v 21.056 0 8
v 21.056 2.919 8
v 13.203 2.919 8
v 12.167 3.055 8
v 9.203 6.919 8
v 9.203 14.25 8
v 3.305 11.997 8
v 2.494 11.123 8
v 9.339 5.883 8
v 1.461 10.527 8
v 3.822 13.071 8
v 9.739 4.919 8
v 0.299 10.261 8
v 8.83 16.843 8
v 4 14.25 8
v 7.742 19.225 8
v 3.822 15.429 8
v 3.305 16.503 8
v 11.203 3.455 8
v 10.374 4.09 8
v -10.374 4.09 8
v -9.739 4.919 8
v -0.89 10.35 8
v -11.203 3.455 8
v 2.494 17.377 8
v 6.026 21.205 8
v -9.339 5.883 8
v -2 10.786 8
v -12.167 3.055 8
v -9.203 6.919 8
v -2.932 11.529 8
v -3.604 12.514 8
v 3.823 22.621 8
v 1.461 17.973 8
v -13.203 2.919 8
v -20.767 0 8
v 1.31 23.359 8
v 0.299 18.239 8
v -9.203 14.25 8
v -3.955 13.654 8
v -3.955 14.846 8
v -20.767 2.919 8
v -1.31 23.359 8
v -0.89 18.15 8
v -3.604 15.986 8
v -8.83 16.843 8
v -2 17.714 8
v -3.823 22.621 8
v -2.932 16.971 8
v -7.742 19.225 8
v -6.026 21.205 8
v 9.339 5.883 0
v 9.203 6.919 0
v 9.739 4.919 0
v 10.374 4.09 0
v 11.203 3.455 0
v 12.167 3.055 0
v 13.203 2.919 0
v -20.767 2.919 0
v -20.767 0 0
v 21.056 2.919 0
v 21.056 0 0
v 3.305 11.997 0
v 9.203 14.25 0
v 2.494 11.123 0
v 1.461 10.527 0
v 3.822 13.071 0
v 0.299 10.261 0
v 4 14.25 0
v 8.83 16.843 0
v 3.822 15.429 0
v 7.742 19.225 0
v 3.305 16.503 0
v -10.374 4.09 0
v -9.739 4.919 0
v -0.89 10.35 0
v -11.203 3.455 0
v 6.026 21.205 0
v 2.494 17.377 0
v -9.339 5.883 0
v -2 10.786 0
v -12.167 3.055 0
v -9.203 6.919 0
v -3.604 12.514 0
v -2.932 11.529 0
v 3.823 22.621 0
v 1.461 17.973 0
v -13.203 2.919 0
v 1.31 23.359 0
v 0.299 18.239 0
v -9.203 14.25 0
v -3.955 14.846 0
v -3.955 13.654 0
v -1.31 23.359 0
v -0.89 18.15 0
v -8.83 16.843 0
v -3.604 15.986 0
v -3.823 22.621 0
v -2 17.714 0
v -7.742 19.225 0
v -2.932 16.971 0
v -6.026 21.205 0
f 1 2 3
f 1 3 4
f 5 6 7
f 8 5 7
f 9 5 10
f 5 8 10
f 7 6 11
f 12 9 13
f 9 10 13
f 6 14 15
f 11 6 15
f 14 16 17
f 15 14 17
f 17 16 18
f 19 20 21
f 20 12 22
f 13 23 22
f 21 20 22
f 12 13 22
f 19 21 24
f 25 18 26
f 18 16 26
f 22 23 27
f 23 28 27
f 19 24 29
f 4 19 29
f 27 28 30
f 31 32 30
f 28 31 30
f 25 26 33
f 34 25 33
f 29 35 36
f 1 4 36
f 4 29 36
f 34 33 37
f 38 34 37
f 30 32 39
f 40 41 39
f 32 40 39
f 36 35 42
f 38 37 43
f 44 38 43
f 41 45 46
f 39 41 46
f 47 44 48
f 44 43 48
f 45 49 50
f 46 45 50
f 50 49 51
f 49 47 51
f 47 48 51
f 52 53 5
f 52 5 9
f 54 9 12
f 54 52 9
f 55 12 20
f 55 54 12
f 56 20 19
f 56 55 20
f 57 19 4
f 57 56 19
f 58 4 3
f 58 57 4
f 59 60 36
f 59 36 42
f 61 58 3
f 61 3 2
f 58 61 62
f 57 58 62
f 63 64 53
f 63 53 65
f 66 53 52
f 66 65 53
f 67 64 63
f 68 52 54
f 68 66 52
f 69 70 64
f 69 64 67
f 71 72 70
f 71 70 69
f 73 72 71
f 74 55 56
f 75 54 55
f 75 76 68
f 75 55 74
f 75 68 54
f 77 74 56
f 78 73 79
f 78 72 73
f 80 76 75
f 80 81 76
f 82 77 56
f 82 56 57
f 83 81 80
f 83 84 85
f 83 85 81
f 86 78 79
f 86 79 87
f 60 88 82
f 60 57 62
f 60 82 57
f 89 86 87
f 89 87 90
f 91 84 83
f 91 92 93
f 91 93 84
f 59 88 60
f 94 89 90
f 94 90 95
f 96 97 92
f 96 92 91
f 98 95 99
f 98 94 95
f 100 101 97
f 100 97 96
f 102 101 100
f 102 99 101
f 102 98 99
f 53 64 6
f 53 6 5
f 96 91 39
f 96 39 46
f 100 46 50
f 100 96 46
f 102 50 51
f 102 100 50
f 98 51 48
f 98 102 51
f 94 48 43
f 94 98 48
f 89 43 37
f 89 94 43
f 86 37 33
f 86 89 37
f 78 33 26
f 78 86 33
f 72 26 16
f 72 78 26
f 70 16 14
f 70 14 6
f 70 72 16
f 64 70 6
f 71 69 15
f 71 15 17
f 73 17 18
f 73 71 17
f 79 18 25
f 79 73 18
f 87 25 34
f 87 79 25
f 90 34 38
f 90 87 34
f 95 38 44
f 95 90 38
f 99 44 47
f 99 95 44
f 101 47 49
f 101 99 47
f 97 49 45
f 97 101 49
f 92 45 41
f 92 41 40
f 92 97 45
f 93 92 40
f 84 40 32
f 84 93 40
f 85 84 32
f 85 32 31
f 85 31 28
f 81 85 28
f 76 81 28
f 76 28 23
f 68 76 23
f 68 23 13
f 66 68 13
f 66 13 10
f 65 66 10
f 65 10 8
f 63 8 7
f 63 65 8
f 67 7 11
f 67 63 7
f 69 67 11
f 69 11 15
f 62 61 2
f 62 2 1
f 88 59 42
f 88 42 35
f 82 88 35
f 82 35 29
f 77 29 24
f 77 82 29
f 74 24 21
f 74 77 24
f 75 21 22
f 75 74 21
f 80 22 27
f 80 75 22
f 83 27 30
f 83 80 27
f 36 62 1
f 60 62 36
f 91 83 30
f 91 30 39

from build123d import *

# Parameters (mm, degrees)
SKETCH1_R           = 4
BOSS_EXTRUDE1_DEPTH = 8


with BuildPart() as part:
    # Sketch1 → Boss-Extrude1 (new body)
    with BuildSketch(Plane.XY):
        with BuildLine():
            Line((-20.767338367, 0), (-20.767338367, 2.918605514))
            Line((-20.767338367, 2.918605514), (-13.202627173, 2.918605514))
            ThreePointArc((-13.202627173, 2.918605514), (-10.374200048, 4.090178389), (-9.202627173, 6.918605514))
            Line((-9.202627173, 6.918605514), (-9.202627173, 14.25))
            ThreePointArc((-9.202627173, 14.25), (0, 23.452627173), (9.202627173, 14.25))
            Line((9.202627173, 14.25), (9.202627173, 6.918605514))
            ThreePointArc((9.202627173, 6.918605514), (10.374200048, 4.090178389), (13.202627173, 2.918605514))
            Line((13.202627173, 2.918605514), (21.055610972, 2.918605514))
            Line((21.055610972, 2.918605514), (21.055610972, 0))
            Line((21.055610972, 0), (-20.767338367, 0))
        make_face()
        with Locations((0, 14.25)):
            Circle(SKETCH1_R, mode=Mode.SUBTRACT)
    extrude(amount=BOSS_EXTRUDE1_DEPTH)


solid = part.part
